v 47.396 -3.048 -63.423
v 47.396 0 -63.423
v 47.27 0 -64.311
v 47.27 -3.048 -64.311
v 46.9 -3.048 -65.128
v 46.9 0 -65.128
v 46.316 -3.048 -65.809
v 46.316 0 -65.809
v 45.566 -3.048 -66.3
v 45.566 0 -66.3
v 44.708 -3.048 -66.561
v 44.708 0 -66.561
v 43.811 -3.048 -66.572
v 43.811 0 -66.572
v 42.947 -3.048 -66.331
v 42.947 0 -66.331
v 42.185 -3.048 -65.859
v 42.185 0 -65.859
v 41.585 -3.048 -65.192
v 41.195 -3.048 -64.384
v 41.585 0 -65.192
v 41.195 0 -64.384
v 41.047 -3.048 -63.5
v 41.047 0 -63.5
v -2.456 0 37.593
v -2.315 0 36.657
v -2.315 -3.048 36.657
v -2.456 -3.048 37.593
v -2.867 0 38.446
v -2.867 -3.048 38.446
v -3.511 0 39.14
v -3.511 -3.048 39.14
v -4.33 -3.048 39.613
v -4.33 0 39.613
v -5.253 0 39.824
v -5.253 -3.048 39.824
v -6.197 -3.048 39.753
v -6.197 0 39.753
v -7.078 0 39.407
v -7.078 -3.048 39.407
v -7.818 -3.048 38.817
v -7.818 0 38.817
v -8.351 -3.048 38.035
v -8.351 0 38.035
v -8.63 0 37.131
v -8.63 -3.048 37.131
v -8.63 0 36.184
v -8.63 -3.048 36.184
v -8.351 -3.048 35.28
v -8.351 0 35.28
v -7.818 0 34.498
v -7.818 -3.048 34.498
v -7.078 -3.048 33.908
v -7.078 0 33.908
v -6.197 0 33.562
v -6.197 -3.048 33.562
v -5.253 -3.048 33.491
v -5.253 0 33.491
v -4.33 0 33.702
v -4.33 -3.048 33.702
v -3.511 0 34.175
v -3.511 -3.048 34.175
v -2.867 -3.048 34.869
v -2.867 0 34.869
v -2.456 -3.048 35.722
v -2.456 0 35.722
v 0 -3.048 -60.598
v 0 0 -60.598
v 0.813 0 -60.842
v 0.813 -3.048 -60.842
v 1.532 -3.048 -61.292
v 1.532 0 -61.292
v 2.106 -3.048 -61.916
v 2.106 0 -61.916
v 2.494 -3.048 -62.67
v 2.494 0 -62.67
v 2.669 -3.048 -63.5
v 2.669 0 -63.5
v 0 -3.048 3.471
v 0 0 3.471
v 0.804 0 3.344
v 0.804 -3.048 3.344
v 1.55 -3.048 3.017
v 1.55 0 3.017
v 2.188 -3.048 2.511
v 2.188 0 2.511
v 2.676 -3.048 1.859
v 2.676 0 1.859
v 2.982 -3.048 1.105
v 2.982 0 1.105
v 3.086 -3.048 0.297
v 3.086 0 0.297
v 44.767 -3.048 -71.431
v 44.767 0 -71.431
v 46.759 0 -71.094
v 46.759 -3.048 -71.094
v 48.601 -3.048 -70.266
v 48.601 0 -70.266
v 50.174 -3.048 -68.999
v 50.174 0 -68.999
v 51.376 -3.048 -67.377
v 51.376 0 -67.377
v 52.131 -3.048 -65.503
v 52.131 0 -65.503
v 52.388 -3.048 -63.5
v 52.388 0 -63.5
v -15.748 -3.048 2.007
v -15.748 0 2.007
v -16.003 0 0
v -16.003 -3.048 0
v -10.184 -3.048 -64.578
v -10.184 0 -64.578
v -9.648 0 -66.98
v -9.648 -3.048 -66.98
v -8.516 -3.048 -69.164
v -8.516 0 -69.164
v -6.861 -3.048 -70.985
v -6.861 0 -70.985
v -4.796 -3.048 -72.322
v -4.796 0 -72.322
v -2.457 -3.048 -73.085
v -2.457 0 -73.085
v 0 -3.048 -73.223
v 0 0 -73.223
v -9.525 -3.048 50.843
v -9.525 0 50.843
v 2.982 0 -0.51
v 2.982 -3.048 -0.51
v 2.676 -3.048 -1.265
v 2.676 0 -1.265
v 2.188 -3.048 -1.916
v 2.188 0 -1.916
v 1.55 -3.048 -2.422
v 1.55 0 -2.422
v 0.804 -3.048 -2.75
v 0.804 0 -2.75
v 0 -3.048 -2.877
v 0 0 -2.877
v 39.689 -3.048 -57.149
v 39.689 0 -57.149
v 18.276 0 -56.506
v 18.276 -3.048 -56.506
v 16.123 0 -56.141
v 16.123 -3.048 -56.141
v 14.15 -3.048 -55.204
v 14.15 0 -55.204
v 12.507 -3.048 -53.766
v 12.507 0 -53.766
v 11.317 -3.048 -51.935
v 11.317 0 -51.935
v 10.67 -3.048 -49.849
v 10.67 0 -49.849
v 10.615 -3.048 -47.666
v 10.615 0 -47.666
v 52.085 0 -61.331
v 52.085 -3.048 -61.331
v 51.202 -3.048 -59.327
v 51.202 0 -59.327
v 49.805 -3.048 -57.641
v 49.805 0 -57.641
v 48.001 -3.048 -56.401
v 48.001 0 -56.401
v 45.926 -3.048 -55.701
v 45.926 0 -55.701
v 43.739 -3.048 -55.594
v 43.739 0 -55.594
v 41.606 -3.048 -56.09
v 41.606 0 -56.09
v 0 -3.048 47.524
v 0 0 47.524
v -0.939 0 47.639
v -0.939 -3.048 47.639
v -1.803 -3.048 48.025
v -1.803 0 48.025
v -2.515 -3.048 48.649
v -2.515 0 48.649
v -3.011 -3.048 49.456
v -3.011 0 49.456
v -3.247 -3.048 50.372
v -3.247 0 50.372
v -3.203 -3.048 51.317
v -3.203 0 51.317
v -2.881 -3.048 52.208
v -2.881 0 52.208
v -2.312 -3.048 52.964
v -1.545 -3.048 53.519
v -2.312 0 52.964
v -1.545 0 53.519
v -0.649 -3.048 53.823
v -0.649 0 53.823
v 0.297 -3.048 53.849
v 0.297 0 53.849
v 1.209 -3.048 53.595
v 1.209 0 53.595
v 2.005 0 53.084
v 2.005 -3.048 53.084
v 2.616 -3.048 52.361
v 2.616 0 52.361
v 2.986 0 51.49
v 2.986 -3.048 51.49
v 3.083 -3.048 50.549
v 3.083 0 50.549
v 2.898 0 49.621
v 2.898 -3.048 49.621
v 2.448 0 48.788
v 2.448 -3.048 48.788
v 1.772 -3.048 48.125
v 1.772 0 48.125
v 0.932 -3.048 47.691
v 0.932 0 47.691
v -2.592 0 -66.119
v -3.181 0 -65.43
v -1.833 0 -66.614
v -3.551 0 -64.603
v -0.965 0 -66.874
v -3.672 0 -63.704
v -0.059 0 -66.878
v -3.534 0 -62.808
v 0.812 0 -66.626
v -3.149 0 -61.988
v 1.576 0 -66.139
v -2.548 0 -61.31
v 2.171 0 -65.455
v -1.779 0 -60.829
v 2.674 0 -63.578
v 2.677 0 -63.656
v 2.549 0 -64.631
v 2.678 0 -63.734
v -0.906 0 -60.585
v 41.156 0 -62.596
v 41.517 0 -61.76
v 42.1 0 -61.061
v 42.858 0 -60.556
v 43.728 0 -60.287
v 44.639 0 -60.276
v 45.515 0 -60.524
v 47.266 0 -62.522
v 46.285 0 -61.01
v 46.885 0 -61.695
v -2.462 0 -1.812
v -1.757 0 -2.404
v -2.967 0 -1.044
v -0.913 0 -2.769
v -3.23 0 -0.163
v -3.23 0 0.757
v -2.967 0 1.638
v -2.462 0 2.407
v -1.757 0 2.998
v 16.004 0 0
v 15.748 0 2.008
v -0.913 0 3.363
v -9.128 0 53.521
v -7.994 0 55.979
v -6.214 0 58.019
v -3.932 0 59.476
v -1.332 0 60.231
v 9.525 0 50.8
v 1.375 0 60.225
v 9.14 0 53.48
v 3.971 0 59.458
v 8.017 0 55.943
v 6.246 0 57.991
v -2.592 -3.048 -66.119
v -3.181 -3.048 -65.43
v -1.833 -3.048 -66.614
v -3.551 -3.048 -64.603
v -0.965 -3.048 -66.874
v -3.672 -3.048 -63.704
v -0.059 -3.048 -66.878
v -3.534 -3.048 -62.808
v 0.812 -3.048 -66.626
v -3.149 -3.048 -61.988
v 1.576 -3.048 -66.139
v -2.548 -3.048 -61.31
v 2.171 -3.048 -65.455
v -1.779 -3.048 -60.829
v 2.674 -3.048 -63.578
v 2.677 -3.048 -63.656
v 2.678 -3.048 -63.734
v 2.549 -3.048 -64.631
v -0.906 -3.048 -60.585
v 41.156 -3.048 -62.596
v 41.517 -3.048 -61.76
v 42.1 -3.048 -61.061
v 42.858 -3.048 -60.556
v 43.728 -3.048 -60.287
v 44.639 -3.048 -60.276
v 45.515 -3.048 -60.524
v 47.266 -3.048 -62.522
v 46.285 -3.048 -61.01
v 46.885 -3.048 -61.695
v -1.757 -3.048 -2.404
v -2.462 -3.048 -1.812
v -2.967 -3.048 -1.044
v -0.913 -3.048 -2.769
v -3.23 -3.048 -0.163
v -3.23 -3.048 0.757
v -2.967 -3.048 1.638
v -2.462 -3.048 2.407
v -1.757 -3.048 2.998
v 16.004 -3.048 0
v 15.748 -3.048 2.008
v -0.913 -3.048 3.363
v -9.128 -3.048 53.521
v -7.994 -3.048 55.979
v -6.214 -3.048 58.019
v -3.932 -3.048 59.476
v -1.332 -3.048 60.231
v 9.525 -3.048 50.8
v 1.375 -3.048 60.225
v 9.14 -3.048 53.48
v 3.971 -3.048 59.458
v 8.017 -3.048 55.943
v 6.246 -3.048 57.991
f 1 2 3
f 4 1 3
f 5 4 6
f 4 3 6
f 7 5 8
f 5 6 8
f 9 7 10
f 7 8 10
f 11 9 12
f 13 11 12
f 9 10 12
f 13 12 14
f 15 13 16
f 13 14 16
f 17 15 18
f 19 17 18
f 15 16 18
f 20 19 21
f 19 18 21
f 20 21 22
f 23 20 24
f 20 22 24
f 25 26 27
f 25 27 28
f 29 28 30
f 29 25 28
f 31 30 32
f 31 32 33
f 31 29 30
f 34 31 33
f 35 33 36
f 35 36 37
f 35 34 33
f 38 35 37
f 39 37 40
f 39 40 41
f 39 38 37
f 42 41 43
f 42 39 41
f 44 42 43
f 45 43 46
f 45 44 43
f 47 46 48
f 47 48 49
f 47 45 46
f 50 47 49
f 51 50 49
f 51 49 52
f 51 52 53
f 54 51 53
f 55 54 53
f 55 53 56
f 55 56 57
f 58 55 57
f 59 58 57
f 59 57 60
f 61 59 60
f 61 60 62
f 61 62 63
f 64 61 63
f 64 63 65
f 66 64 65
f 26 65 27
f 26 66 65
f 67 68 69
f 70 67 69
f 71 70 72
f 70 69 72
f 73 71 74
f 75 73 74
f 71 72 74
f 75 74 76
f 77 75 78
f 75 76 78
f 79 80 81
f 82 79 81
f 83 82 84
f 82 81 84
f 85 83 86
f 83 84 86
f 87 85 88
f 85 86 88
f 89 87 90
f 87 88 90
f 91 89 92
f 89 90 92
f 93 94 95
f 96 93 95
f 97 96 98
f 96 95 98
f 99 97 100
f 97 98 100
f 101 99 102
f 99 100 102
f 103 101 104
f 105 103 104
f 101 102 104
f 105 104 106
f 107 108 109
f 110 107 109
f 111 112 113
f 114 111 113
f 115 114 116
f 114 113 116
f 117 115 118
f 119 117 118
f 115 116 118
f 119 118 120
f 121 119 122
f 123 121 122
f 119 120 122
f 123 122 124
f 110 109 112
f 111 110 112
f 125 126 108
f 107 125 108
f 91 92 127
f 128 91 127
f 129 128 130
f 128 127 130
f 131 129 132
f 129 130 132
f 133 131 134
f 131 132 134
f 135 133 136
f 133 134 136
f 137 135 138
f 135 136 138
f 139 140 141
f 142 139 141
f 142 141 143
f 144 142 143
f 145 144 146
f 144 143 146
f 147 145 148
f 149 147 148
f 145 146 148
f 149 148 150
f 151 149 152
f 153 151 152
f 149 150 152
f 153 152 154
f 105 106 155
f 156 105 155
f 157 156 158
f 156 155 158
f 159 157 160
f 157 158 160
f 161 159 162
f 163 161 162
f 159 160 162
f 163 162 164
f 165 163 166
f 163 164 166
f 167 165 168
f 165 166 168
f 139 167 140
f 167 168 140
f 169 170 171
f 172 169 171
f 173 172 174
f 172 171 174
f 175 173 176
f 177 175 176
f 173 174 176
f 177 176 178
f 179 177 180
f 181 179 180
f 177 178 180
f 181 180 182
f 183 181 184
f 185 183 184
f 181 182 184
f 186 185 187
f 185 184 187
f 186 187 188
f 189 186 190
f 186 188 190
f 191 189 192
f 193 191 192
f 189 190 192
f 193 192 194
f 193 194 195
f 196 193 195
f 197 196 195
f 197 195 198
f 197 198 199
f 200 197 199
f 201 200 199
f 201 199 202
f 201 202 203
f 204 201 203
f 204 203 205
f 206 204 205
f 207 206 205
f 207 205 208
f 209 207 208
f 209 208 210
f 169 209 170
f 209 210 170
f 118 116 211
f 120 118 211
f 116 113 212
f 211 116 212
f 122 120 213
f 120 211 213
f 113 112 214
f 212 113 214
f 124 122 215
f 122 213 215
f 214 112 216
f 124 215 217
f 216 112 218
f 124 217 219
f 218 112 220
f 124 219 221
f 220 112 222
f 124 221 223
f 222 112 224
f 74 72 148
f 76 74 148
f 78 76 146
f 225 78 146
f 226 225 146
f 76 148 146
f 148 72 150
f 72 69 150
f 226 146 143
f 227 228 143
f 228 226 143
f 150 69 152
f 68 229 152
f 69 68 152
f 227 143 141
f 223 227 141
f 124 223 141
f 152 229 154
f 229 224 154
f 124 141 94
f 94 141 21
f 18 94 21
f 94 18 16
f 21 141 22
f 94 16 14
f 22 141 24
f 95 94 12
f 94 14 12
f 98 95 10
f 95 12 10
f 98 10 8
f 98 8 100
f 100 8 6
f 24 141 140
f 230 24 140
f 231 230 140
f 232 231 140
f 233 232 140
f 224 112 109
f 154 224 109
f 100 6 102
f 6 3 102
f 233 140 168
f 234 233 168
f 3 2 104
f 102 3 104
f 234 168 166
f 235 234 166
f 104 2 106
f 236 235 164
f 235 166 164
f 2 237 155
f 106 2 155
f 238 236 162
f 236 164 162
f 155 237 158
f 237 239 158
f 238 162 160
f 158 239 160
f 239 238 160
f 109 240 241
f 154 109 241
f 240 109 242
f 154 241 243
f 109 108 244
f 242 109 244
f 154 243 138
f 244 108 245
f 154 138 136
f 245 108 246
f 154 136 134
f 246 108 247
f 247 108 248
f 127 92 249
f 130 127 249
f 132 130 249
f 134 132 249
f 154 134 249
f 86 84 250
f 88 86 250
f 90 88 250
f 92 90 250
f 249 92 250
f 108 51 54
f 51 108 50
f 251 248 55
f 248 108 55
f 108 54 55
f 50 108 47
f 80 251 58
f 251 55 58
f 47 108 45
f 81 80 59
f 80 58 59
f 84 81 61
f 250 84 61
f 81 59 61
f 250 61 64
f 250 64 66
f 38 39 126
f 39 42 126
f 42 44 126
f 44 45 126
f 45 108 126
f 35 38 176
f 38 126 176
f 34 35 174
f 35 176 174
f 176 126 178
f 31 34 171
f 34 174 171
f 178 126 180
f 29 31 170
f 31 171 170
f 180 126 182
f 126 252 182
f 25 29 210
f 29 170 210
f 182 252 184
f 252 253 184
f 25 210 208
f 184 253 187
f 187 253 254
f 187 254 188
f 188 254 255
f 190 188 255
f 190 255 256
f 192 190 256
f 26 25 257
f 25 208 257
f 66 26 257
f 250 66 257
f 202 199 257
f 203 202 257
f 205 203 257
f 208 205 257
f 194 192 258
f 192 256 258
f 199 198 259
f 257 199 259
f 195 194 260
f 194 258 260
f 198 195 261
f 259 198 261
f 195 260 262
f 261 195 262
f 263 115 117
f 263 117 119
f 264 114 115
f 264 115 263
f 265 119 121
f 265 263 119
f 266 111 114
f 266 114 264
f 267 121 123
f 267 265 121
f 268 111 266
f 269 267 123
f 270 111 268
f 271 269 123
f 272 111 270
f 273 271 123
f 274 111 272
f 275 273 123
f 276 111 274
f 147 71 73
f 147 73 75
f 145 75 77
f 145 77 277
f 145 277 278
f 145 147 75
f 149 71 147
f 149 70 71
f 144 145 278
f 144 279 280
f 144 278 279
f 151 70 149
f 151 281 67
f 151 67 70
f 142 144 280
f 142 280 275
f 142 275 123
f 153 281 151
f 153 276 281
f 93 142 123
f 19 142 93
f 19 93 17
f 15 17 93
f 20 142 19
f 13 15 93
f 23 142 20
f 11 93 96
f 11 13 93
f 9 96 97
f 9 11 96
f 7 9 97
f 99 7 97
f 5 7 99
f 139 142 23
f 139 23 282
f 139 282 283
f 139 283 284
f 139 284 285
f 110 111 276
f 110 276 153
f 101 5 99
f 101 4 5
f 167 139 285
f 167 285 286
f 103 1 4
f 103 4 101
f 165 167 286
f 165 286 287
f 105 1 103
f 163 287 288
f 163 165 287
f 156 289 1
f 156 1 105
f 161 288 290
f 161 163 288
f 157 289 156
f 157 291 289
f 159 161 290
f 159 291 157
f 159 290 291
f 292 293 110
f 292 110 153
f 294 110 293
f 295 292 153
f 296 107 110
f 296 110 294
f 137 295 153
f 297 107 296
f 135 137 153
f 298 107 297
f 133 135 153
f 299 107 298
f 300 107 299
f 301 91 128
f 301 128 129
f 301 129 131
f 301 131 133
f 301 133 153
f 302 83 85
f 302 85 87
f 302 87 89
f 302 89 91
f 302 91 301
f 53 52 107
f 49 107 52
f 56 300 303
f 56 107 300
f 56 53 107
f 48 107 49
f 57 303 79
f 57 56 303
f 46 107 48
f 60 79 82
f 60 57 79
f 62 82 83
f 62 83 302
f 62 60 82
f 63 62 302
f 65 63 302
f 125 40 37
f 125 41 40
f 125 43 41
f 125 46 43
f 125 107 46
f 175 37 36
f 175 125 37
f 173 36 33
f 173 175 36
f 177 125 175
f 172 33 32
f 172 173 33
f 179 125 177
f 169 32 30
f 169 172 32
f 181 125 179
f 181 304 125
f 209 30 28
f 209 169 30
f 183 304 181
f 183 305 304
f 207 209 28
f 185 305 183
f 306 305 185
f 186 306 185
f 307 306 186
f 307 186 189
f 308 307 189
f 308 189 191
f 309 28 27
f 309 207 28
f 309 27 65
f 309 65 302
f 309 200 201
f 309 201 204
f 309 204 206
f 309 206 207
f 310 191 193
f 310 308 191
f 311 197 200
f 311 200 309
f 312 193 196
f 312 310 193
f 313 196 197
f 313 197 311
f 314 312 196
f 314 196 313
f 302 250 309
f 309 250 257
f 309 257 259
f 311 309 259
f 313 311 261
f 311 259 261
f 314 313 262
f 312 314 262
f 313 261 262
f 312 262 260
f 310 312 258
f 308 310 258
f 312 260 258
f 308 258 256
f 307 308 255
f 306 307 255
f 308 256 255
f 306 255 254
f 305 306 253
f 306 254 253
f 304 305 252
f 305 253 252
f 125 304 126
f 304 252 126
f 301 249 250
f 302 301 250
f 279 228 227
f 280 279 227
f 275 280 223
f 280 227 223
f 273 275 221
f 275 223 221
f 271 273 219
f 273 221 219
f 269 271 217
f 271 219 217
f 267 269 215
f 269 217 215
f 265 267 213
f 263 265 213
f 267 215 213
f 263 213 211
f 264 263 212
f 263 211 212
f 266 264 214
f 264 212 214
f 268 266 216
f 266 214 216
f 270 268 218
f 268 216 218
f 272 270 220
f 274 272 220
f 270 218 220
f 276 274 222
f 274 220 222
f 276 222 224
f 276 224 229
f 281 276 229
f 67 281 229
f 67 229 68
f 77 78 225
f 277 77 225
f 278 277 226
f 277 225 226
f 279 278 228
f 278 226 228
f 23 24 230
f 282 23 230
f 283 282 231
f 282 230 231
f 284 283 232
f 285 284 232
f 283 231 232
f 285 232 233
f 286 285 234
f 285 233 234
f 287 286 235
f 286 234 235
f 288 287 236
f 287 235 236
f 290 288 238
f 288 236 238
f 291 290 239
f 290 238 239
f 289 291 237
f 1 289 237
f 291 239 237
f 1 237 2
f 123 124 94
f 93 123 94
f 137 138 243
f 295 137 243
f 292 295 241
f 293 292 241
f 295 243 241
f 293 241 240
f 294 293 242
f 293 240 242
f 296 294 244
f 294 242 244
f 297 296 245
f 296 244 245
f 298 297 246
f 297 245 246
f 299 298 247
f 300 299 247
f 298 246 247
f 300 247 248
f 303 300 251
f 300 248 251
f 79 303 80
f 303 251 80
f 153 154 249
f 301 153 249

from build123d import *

# Parameters (mm, degrees)
F0_R     = 3.175
F1_DEPTH = 3.048


with BuildPart() as f1:
    # F0 (on Front) → F1 (new body)
    with BuildSketch(Plane.XZ):
        with BuildLine():
            ThreePointArc((0, -2.8766015808), (-3.2635982736, 0.2971620124), (0, 3.4709256057))
            Line((0, 3.4709256057), (0, 15.8749901004))
            ThreePointArc((0, 15.8749901004), (-10.4918952223, 11.913601197), (-15.7476019291, 2.0065322858))
            ThreePointArc((-15.7476019291, 2.0065322858), (-11.9135847518, -10.4919245087), (0, -15.8750098992))
            Line((0, -15.8750098992), (0, -2.8766015808))
        make_face()
        with BuildLine():
            Line((0, 15.8749901004), (0, 3.4709256057))
            ThreePointArc((0, 3.4709256057), (2.1875744482, 2.5106801941), (3.0864017264, 0.2971620124))
            ThreePointArc((3.0864017264, 0.2971620124), (2.1875744482, -1.9163561693), (0, -2.8766015808))
            Line((0, -2.8766015808), (0, -15.8750098992))
            ThreePointArc((0, -15.8750098992), (11.2253703753, -11.2253575191), (15.8750776924, -9.8994e-06))
            ThreePointArc((15.8750776924, -9.8994e-06), (15.8431590584, 1.0061699208), (15.747531509, 2.0083036452))
            ThreePointArc((15.747531509, 2.0083036452), (10.491322233, 11.9142426155), (0, 15.8749901004))
        make_face()
        with BuildLine():
            ThreePointArc((-15.7476019291, 2.0065322858), (-10.4918952223, 11.913601197), (0, 15.8749901004))
            Line((0, 15.8749901004), (0, 41.275))
            ThreePointArc((0, 41.275), (-6.7504945807, 44.0801452459), (-9.5249014384, 50.8433311461))
            Line((-9.5249014384, 50.8433311461), (-15.7476019291, 2.0065322858))
        make_face()
        with Locations((-5.4904264398, 36.6574451327)):
            Circle(F0_R, mode=Mode.SUBTRACT)
        with BuildLine():
            Line((0, 41.275), (0, 15.8749901004))
            ThreePointArc((0, 15.8749901004), (10.491322233, 11.9142426155), (15.747531509, 2.0083036452))
            Line((15.747531509, 2.0083036452), (9.525, 50.8))
            ThreePointArc((9.525, 50.8), (6.7351920908, 44.0648079092), (0, 41.275))
        make_face()
        with BuildLine():
            ThreePointArc((15.8750776924, -9.8994e-06), (11.2253703753, -11.2253575191), (0, -15.8750098992))
            Line((0, -15.8750098992), (0, -54.2240571164))
            ThreePointArc((0, -54.2240571164), (6.2034967284, -57.1581140139), (8.8250504044, -63.5))
            Line((8.8250504044, -63.5), (36.5125, -63.5))
            ThreePointArc((36.5125, -63.5), (37.3509047062, -59.9494011406), (39.6890045065, -57.1488718986))
            Line((39.6890045065, -57.1488718986), (18.2762879211, -56.5058330852))
            ThreePointArc((18.2762879211, -56.5058330852), (12.5071090556, -53.7661112831), (10.6150505702, -47.6661428387))
            Line((10.6150505702, -47.6661428387), (16.0036556786, 0))
            Line((16.0036556786, 0), (15.747531509, 2.0083036452))
            ThreePointArc((15.747531509, 2.0083036452), (15.8431590584, 1.0061699208), (15.8750776924, -9.8994e-06))
        make_face()
        with BuildLine():
            Line((0, -54.2240571164), (0, -15.8750098992))
            ThreePointArc((0, -15.8750098992), (-11.9135847518, -10.4919245087), (-15.7476019291, 2.0065322858))
            Line((-15.7476019291, 2.0065322858), (-16.0032708044, 0))
            Line((-16.0032708044, 0), (-10.1838874689, -64.5783643789))
            ThreePointArc((-10.1838874689, -64.5783643789), (-7.4881720596, -57.0444215396), (0, -54.2240571164))
        make_face()
        with BuildLine():
            ThreePointArc((-9.5249014384, 50.8433311461), (-6.7504945807, 44.0801452459), (0, 41.275))
            ThreePointArc((0, 41.275), (6.7351920908, 44.0648079092), (9.525, 50.8))
            ThreePointArc((9.525, 50.8), (0.0216656291, 60.3249753596), (-9.5249014384, 50.8433311461))
        make_face()
        with BuildLine():
            ThreePointArc((3.0864017264, 50.6975539029), (2.1875744482, 48.4840357212), (0, 47.5237903096))
            ThreePointArc((0, 47.5237903096), (-2.3647709953, 52.9110720846), (3.0864017264, 50.6975539029))
        make_face(mode=Mode.SUBTRACT)
        with BuildLine():
            Line((0, -60.598008398), (0, -54.2240571164))
            ThreePointArc((0, -54.2240571164), (-7.4881720596, -57.0444215396), (-10.1838874689, -64.5783643789))
            ThreePointArc((-10.1838874689, -64.5783643789), (-6.8613205089, -70.985095451), (0, -73.222937069))
            ThreePointArc((0, -73.222937069), (6.2800529577, -70.2074613128), (8.8276728625, -63.7234970927))
            ThreePointArc((8.8276728625, -63.7234970927), (8.8270172254, -63.6117408538), (8.8250504044, -63.5))
            Line((8.8250504044, -63.5), (2.6692960727, -63.5))
            ThreePointArc((2.6692960727, -63.5), (2.6757633798, -63.6168482324), (2.6779201256, -63.7338554285))
            ThreePointArc((2.6779201256, -63.7338554285), (-2.9115004676, -65.7956988268), (0, -60.598008398))
        make_face()
        with BuildLine():
            Line((36.5125, -63.5), (8.8250504044, -63.5))
            ThreePointArc((8.8250504044, -63.5), (8.8270172254, -63.6117408538), (8.8276728625, -63.7234970927))
            ThreePointArc((8.8276728625, -63.7234970927), (6.2800529577, -70.2074613128), (0, -73.222937069))
            Line((0, -73.222937069), (44.7674390348, -71.4311498983))
            ThreePointArc((44.7674390348, -71.4311498983), (38.9507166871, -69.2237915139), (36.5125, -63.5))
        make_face()
        with BuildLine():
            ThreePointArc((39.6890045065, -57.1488718986), (37.3509047062, -59.9494011406), (36.5125, -63.5))
            ThreePointArc((36.5125, -63.5), (38.9507166871, -69.2237915139), (44.7674390348, -71.4311498983))
            ThreePointArc((44.7674390348, -71.4311498983), (50.1737915139, -68.9992833129), (52.3875, -63.5))
            ThreePointArc((52.3875, -63.5), (48.0005988594, -56.4009047062), (39.6890045065, -57.1488718986))
        make_face()
        with BuildLine():
            ThreePointArc((47.3964347422, -63.4233355522), (44.2597697605, -66.5981041149), (41.0473604579, -63.5))
            ThreePointArc((41.0473604579, -63.5), (44.1830997239, -60.2485669896), (47.3964347422, -63.4233355522))
        make_face(mode=Mode.SUBTRACT)
        with BuildLine():
            ThreePointArc((8.8250504044, -63.5), (6.2034967284, -57.1581140139), (0, -54.2240571164))
            Line((0, -54.2240571164), (0, -60.598008398))
            ThreePointArc((0, -60.598008398), (1.8397162129, -61.5844347981), (2.6692960727, -63.5))
            Line((2.6692960727, -63.5), (8.8250504044, -63.5))
        make_face()
    extrude(amount=F1_DEPTH)


solid = f1.part
